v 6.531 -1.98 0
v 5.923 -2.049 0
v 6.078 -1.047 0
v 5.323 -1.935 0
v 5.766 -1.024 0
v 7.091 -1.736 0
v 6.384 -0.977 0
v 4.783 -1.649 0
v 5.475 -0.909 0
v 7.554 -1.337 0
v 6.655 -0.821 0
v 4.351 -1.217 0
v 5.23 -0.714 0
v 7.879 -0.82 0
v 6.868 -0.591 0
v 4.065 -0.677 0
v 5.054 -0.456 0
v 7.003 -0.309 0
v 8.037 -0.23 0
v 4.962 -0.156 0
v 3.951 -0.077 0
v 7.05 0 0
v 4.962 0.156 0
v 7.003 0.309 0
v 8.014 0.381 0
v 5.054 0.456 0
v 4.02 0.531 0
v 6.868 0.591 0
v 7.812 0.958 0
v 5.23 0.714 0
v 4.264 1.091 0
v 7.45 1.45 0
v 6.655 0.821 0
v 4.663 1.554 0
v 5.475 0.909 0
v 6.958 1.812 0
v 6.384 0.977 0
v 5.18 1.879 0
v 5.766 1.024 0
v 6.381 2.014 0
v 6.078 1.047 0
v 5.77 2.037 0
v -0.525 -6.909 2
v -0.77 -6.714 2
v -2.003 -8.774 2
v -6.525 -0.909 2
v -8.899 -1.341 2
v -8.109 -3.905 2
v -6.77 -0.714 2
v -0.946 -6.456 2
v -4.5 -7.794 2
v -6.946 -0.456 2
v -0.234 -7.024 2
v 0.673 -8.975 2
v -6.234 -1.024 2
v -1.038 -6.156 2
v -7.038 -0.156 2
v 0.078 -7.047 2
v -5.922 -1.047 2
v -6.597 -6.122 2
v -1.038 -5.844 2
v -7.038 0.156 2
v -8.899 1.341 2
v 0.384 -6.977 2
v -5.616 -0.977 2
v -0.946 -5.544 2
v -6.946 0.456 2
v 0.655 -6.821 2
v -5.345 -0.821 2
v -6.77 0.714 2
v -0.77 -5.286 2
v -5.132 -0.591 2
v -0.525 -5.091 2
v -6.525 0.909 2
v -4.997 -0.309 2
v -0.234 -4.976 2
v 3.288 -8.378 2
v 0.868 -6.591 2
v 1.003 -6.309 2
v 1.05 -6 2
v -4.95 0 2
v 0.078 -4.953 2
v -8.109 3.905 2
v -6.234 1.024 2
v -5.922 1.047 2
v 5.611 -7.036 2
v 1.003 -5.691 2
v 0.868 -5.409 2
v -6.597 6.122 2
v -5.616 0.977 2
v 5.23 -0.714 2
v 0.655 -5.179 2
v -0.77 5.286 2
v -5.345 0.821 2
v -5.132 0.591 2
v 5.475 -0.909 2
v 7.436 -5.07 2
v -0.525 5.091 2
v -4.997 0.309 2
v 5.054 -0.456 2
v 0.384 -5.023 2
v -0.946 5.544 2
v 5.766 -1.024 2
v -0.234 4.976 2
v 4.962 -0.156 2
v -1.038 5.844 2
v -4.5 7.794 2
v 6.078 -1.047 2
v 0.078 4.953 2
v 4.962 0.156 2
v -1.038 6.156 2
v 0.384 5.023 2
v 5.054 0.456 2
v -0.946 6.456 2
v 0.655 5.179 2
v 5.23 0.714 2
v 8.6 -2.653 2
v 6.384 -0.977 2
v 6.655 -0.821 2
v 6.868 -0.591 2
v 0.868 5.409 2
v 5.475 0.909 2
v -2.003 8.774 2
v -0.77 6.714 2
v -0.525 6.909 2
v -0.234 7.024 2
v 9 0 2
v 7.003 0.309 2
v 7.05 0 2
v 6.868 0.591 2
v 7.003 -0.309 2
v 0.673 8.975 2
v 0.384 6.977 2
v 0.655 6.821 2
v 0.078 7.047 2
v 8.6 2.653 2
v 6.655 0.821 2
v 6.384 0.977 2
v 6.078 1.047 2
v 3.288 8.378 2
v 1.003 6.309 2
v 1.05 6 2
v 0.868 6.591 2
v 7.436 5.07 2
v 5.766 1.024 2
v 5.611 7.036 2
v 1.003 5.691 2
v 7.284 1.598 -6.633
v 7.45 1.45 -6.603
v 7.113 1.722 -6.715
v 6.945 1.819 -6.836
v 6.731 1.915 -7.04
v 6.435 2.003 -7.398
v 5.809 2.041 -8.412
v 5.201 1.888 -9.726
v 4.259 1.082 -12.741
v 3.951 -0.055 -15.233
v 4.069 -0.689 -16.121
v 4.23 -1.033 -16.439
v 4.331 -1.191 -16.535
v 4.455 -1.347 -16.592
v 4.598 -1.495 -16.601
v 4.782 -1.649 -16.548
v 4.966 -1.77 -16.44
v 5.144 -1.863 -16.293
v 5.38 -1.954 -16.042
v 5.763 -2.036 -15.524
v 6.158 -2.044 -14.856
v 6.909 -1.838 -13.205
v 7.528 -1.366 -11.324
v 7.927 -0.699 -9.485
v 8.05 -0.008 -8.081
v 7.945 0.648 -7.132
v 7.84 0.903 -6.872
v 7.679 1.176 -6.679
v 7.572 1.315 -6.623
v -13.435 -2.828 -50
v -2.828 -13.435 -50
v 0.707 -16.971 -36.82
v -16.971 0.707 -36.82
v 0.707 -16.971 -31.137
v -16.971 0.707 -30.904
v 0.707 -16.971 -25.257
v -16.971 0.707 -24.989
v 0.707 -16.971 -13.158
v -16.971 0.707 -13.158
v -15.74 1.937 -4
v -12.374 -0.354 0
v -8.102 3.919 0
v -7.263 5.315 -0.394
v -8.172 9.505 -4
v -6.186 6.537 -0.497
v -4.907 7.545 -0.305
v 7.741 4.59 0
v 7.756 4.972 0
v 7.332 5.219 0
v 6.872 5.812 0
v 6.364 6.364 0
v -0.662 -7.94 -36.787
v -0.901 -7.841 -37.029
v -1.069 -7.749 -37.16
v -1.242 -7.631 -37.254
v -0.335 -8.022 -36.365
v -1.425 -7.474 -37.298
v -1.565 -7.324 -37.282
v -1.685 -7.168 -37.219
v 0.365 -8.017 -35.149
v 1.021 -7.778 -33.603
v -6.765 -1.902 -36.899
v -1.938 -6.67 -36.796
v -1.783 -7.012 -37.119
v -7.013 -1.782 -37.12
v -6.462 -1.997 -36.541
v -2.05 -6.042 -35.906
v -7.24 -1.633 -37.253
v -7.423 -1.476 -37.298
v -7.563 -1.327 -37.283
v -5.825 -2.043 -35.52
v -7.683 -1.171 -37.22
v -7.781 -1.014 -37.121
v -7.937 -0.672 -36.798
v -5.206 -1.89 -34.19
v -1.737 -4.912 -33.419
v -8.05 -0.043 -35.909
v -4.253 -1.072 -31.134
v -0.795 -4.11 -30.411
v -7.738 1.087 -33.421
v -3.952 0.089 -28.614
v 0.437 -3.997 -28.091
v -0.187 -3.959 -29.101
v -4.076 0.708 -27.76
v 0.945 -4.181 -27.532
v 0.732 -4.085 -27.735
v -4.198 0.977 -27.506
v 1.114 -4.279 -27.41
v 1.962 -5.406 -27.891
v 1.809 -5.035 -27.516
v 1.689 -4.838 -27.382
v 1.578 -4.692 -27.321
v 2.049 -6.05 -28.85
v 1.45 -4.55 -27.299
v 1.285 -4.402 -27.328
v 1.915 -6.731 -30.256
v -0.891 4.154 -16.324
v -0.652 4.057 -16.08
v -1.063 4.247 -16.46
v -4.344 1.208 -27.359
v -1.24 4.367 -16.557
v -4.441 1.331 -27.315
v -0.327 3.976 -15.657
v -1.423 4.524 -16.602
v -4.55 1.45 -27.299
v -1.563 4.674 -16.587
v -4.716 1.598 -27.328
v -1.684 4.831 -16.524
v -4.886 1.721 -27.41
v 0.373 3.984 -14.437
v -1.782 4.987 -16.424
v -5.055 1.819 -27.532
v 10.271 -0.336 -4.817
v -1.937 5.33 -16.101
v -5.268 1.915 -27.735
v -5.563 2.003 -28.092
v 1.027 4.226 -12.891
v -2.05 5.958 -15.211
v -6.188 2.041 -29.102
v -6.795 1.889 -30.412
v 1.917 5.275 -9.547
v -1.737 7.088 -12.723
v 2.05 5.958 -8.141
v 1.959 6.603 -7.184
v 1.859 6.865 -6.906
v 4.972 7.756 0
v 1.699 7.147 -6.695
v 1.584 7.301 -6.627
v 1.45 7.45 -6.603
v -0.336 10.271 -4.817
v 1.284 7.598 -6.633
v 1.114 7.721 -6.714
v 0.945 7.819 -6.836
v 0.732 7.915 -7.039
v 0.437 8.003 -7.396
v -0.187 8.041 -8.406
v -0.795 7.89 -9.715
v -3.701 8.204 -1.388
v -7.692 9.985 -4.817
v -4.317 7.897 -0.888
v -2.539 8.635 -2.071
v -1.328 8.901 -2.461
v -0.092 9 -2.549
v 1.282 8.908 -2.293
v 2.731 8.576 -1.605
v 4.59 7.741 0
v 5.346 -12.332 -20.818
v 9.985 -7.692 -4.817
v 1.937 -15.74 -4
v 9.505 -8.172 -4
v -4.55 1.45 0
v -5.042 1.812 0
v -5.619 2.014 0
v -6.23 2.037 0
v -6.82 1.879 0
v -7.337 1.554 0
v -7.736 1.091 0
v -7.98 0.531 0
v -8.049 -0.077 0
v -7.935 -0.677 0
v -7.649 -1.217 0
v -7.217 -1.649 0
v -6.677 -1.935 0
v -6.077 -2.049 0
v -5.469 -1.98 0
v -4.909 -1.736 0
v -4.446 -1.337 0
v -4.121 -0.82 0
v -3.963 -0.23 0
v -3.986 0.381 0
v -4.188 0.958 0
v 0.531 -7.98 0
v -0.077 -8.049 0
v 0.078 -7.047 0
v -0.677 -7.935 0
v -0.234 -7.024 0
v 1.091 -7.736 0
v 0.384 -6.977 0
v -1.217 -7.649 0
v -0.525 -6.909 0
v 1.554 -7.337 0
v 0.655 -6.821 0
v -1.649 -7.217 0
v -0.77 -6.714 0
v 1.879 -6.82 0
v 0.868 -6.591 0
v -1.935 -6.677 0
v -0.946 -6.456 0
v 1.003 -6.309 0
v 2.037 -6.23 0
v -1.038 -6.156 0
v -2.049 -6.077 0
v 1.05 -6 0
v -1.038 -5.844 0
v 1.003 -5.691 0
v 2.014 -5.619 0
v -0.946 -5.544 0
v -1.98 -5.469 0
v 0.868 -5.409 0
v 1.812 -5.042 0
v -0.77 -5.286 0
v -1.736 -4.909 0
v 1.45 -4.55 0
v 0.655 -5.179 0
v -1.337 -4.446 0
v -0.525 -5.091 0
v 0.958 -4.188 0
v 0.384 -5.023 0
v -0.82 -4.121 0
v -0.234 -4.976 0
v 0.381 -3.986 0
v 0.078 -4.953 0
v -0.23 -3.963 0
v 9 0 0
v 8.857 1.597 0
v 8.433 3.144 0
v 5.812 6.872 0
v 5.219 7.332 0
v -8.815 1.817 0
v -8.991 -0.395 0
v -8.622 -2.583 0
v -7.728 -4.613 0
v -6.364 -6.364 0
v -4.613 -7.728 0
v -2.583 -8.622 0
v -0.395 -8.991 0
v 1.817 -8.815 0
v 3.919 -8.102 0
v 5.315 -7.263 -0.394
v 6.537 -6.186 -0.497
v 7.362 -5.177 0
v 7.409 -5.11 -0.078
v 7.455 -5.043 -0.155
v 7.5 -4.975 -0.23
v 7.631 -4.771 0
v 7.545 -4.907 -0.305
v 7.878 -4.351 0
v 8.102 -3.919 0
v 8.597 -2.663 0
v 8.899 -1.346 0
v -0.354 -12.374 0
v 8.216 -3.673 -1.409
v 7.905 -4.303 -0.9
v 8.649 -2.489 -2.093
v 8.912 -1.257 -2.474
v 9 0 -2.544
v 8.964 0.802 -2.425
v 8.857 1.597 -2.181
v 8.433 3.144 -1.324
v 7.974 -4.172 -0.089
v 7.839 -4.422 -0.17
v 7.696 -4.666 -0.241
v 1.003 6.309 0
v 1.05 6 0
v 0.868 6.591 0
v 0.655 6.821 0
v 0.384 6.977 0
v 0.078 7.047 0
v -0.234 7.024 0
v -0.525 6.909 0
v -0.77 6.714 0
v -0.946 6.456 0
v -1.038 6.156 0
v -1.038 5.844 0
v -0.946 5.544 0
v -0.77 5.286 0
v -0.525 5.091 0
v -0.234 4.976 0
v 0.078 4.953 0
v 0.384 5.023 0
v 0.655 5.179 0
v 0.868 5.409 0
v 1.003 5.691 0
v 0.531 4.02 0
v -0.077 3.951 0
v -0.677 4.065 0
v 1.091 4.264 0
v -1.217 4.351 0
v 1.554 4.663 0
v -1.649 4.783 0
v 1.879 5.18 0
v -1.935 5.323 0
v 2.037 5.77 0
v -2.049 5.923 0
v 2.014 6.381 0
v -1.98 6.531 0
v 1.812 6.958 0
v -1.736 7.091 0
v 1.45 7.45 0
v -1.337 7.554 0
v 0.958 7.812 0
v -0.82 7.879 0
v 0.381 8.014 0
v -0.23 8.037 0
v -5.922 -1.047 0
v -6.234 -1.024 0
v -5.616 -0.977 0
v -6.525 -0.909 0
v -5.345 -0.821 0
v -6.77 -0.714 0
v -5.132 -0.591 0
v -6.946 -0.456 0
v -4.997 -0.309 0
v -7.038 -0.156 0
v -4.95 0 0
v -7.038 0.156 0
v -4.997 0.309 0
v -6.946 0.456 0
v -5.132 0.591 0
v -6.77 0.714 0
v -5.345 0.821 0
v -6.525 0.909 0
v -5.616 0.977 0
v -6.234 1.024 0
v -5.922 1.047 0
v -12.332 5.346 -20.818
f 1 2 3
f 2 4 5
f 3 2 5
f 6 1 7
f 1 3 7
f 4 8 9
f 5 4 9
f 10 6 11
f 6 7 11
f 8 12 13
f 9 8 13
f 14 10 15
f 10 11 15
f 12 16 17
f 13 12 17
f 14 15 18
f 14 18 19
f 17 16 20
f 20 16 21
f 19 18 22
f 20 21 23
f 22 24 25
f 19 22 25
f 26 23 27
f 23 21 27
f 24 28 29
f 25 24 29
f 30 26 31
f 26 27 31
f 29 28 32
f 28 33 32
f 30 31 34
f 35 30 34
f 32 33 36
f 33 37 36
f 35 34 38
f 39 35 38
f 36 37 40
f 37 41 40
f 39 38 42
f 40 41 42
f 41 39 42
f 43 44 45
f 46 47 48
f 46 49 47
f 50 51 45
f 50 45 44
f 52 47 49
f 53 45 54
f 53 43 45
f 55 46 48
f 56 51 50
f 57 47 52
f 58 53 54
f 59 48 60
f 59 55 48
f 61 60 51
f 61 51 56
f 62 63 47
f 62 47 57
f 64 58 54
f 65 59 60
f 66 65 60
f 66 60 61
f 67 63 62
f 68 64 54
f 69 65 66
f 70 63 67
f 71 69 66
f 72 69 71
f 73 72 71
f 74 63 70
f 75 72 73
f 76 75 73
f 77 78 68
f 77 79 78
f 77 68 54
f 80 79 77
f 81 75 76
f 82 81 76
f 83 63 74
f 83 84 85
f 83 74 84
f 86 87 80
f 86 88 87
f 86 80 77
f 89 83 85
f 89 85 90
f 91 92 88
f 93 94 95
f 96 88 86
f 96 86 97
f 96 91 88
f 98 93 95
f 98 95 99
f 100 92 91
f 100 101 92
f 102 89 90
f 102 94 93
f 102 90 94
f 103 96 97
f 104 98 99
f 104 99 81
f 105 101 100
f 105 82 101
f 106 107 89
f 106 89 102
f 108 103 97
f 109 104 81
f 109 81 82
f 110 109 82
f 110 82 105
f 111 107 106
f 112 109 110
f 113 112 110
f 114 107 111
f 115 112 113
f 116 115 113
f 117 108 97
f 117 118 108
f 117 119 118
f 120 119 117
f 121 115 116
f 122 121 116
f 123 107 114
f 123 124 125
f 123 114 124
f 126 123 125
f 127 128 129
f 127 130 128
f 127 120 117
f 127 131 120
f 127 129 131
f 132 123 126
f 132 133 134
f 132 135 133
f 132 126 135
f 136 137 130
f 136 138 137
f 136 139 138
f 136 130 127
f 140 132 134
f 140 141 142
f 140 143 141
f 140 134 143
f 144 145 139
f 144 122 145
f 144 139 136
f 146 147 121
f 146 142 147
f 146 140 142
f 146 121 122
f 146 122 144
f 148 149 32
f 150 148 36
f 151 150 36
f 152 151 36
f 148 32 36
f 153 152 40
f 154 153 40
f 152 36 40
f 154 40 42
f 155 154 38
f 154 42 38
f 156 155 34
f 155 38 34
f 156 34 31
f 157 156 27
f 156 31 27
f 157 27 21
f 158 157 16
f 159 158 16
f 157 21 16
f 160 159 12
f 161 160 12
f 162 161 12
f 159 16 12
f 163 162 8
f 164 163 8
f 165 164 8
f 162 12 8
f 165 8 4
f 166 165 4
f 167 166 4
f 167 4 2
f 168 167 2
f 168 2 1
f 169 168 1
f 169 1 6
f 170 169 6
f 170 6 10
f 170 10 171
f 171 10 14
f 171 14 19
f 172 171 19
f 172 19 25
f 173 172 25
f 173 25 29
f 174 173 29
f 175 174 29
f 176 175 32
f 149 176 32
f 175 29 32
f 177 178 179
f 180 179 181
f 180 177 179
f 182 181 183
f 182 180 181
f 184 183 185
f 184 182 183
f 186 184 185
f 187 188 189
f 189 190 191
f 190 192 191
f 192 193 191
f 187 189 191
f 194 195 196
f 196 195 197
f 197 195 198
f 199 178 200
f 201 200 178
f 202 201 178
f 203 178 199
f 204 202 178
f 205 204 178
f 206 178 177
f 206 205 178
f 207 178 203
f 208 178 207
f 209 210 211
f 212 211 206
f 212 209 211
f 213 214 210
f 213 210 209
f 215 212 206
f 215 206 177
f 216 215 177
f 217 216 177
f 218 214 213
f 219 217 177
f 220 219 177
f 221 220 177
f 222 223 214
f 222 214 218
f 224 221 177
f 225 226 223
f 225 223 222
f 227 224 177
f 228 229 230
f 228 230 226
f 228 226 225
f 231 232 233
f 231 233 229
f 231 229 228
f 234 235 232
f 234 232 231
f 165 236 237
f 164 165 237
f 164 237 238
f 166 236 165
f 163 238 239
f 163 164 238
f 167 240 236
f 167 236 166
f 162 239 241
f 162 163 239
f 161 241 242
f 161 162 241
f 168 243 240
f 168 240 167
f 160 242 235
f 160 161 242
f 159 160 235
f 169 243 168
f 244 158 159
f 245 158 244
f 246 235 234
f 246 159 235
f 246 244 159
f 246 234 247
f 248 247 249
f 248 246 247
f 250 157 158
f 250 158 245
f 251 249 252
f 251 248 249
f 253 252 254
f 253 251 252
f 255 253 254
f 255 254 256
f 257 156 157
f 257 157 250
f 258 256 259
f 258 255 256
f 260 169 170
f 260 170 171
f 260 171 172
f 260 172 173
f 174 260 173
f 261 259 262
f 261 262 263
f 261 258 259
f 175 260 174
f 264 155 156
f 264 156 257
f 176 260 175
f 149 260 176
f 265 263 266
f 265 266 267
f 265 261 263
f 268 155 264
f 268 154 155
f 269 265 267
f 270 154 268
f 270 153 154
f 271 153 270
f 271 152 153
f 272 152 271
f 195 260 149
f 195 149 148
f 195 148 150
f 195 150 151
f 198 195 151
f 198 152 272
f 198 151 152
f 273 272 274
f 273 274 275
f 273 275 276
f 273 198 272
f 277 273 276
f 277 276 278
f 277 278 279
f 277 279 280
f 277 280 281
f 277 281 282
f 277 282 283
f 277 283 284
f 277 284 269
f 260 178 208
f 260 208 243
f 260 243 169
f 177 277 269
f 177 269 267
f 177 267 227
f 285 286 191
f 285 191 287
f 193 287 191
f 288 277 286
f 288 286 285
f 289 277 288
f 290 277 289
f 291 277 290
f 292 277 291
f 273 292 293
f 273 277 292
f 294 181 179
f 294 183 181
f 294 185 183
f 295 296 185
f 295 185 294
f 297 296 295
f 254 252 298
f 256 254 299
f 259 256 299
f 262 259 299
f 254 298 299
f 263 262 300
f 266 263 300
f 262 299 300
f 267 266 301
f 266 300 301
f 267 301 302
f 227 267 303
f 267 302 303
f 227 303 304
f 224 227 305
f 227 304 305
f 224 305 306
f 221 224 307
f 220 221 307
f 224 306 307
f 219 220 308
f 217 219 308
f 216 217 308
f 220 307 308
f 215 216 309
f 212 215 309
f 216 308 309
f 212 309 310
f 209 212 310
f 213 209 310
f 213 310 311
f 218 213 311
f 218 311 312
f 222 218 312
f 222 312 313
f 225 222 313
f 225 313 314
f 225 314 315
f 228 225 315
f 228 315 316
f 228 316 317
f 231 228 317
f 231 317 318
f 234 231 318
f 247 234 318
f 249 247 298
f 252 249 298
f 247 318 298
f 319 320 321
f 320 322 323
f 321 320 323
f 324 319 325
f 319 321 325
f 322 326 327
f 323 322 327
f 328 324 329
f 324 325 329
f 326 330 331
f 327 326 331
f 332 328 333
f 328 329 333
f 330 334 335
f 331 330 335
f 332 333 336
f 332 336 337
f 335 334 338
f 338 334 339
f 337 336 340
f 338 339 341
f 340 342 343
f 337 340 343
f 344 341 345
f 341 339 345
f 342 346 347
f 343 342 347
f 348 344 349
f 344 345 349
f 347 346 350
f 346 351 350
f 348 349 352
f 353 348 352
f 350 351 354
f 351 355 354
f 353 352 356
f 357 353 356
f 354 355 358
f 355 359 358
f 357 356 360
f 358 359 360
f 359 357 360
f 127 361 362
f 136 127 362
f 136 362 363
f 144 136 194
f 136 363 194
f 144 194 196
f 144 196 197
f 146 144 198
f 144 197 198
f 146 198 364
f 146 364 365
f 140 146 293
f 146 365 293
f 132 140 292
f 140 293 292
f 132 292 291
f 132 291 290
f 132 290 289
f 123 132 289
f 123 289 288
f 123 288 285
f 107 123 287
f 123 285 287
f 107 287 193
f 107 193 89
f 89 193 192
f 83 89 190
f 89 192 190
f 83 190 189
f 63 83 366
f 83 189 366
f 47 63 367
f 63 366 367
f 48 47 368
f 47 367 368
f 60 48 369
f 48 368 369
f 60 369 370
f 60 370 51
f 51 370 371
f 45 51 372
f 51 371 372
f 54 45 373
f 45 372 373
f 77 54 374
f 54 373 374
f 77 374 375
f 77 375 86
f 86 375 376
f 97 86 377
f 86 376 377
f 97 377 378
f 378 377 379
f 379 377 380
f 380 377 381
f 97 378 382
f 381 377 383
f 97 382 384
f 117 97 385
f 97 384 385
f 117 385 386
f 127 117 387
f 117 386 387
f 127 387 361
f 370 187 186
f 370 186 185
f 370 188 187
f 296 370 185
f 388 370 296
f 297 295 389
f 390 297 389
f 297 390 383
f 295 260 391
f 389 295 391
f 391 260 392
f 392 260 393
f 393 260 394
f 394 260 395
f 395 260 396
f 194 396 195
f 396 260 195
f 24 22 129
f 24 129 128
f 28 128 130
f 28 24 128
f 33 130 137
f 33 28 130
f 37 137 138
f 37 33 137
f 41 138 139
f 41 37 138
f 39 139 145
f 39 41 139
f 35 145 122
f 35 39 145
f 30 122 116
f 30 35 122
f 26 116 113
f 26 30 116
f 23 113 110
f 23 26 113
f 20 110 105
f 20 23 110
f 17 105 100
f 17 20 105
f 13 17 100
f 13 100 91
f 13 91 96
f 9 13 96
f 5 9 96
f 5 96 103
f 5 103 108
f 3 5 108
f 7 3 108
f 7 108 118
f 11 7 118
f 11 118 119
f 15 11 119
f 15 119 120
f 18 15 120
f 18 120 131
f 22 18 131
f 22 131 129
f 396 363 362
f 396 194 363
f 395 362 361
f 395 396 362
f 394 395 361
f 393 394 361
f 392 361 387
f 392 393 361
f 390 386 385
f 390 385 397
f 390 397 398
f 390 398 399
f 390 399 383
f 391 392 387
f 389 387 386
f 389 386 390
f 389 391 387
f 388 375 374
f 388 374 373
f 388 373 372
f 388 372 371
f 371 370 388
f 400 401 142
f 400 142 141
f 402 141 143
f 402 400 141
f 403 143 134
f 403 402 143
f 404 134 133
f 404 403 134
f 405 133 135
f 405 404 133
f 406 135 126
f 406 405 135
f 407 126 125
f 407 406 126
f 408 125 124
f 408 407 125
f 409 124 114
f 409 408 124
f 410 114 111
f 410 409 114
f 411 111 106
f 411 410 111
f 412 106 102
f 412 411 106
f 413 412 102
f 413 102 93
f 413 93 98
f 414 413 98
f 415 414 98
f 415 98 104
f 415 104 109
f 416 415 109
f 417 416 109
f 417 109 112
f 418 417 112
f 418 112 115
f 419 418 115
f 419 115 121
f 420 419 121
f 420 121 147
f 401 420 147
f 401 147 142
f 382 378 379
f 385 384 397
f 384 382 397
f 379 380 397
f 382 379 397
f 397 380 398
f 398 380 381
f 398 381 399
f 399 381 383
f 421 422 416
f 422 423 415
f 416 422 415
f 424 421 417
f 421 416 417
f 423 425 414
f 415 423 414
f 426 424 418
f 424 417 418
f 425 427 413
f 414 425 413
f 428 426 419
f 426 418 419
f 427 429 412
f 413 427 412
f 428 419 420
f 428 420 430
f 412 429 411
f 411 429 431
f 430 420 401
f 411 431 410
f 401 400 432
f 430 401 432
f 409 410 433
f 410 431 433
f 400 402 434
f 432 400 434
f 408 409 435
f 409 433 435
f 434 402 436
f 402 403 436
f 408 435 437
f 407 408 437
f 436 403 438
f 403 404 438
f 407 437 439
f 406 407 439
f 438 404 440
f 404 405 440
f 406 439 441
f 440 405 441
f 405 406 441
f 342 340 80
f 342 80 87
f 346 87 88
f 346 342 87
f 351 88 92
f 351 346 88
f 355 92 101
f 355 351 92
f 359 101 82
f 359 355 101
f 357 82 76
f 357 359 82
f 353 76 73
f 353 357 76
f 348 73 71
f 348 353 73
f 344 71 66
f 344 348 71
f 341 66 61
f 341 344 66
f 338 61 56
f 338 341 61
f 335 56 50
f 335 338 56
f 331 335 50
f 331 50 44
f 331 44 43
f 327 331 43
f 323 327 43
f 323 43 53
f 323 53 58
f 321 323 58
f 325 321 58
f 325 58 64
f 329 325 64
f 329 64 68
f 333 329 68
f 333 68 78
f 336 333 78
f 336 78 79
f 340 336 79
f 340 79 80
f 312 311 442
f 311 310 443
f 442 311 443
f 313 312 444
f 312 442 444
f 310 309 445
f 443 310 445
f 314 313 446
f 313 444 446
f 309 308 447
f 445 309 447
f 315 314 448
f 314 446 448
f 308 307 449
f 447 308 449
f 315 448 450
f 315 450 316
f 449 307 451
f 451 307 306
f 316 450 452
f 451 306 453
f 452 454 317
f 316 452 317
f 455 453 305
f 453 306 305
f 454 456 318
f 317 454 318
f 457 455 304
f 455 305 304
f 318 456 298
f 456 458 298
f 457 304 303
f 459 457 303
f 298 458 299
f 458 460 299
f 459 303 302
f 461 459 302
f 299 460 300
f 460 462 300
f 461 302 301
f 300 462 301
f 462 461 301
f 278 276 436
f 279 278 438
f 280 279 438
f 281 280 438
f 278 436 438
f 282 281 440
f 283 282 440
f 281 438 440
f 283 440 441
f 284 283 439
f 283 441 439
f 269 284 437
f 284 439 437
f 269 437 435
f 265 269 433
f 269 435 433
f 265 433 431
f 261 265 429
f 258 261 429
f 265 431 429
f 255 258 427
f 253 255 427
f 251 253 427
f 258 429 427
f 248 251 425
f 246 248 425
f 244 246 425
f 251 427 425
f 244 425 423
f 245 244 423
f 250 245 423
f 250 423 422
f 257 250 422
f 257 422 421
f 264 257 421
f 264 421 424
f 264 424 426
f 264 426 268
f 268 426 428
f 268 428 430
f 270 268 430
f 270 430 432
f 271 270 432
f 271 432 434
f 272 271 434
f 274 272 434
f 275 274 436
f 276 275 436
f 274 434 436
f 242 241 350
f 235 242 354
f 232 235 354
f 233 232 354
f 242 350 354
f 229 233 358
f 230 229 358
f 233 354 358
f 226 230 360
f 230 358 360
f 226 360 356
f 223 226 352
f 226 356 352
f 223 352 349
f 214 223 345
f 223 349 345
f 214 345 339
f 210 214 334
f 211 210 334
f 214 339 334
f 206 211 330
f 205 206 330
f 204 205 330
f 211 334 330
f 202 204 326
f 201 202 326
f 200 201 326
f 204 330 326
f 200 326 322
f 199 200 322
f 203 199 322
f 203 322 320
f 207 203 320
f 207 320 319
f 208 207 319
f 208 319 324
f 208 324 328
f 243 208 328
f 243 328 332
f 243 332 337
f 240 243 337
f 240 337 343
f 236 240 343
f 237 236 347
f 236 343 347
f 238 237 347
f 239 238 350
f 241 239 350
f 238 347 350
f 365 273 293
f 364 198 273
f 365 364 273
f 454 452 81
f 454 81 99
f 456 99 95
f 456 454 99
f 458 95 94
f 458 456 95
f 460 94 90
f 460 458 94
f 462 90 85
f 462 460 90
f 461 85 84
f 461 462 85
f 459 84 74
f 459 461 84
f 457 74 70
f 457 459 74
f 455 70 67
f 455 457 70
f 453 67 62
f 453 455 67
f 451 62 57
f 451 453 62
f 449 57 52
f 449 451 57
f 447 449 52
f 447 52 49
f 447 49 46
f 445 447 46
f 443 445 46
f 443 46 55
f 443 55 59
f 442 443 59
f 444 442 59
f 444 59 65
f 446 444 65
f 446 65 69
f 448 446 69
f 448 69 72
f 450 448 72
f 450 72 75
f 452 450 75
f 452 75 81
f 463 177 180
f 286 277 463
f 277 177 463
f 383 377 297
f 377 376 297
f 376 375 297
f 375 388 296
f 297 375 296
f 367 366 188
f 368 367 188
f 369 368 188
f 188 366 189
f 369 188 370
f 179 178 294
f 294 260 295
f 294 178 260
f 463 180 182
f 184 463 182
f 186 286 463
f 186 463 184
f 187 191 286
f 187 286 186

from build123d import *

# Parameters (mm, degrees)
SKETCH1_R           = 9
SKETCH1_R_2         = 1.05
BOSS_EXTRUDE1_DEPTH = 2
CHAMFER1_SIZE       = 4
CUT_EXTRUDE3_START  = -53
SKETCH6_R           = 1.05
CUT_EXTRUDE3_DEPTH  = 53
CUT_EXTRUDE4_START  = -2
SKETCH5_R           = 2.05
CUT_EXTRUDE4_DEPTH  = 53
CHAMFER2_SIZE       = 5
CHAMFER3_SIZE       = 5
CHAMFER3_SIZE_2     = 4.05977785
SKETCH8_W           = 40.645388092
SKETCH8_H           = 21.779978949
CUT_EXTRUDE5_DEPTH  = 34


with BuildPart() as part:
    # Sketch1 → Boss-Extrude1 (new body)
    with BuildSketch(Plane.XY):
        Circle(SKETCH1_R)
        with Locations((0, 6)):
            Circle(SKETCH1_R_2, mode=Mode.SUBTRACT)
        with Locations((-6, 0)):
            Circle(SKETCH1_R_2, mode=Mode.SUBTRACT)
        with Locations((0, -6)):
            Circle(SKETCH1_R_2, mode=Mode.SUBTRACT)
        with Locations((6, 0)):
            Circle(SKETCH1_R_2, mode=Mode.SUBTRACT)
    extrude(amount=BOSS_EXTRUDE1_DEPTH)

    # Sketch3 → Loft1 section 0
    with BuildSketch(Plane(origin=(0, 0, -50), x_dir=(-1, 0, 0), z_dir=(0, 0, -1))):
        with BuildLine():
            Line((-0.707106781, -16.970562748), (16.970562748, 0.707106781))
            Line((16.970562748, 0.707106781), (21.920310217, -4.242640687))
            Line((21.920310217, -4.242640687), (4.242640687, -21.920310217))
            Line((4.242640687, -21.920310217), (-0.707106781, -16.970562748))
        make_face()
    # Sketch2 → Loft1 section 1
    with BuildSketch(Plane(origin=(0, 0, 0), x_dir=(-1, 0, 0), z_dir=(0, 0, -1))):
        with BuildLine():
            Line((-15.202795796, -2.474873734), (2.474873734, 15.202795796))
            Line((2.474873734, 15.202795796), (15.202795796, 2.474873734))
            Line((15.202795796, 2.474873734), (-2.474873734, -15.202795796))
            Line((-2.474873734, -15.202795796), (-15.202795796, -2.474873734))
        make_face()
    loft()

    # Chamfer1
    # the kernel refuses this chamfer: 4 mm, written as the material it takes off along each edge
    with BuildSketch(Plane(origin=(-4.798944185, -22.476613715, 0), x_dir=(-0.7068394360706721, 0.7068394360706747, 0.027495876610586344), z_dir=(0.7071067811865488, 0.7071067811865462, 0))) as chamfer1_piece_1_section:
        Polygon((CHAMFER1_SIZE * 0.999621916911, -CHAMFER1_SIZE * 0.0274958766106), (-CHAMFER1_SIZE * 0.0274958766106, -CHAMFER1_SIZE * 0.999621916911), (0, 0), align=None)
    chamfer1_piece_1 = extrude(amount=38.573463904, mode=Mode.PRIVATE)
    chamfer1_piece_1 = chamfer1_piece_1 - Plane(origin=(0, 0, -1.322334287), x_dir=(1, 0, 0), z_dir=(0, 0, -1)) * Cylinder(9, 94, mode=Mode.PRIVATE)
    add(chamfer1_piece_1, mode=Mode.SUBTRACT)
    with BuildSketch(Plane(origin=(4.798944185, 22.476613715, 0), x_dir=(0.7068394360706721, -0.7068394360706749, 0.027495876610586396), z_dir=(-0.7071067811865489, -0.7071067811865461, 0))) as chamfer1_piece_2_section:
        Polygon((CHAMFER1_SIZE * 0.999621916911, -CHAMFER1_SIZE * 0.0274958766106), (-CHAMFER1_SIZE * 0.0274958766106, -CHAMFER1_SIZE * 0.999621916911), (0, 0), align=None)
    chamfer1_piece_2 = extrude(amount=38.573463904, mode=Mode.PRIVATE)
    chamfer1_piece_2 = chamfer1_piece_2 - Plane(origin=(0, 0, -1.322334287), x_dir=(1, 0, 0), z_dir=(0, 0, -1)) * Cylinder(9, 94, mode=Mode.PRIVATE)
    add(chamfer1_piece_2, mode=Mode.SUBTRACT)

    # Sketch6 → Cut-Extrude3 (cut)
    with BuildSketch(Plane.XY.offset(2).offset(CUT_EXTRUDE3_START)):
        with Locations(Location((0, -6, 0), (0, 0, 45))):
            Circle(SKETCH6_R)
        with Locations(Location((6, 0, 0), (0, 0, 45))):
            Circle(SKETCH6_R)
        with Locations(Location((0, 6, 0), (0, 0, 45))):
            Circle(SKETCH6_R)
        with Locations(Location((-6, 0, 0), (0, 0, 45))):
            Circle(SKETCH6_R)
    extrude(amount=CUT_EXTRUDE3_DEPTH, mode=Mode.SUBTRACT)

    # Sketch5 → Cut-Extrude4 (cut)
    with BuildSketch(Plane.XY.offset(2).offset(CUT_EXTRUDE4_START)):
        with Locations(Location((-6, 0, 0), (0, 0, 45))):
            Circle(SKETCH5_R)
        with Locations(Location((0, -6, 0), (0, 0, 45))):
            Circle(SKETCH5_R)
        with Locations(Location((0, 6, 0), (0, 0, 45))):
            Circle(SKETCH5_R)
        with Locations(Location((6, 0, 0), (0, 0, 45))):
            Circle(SKETCH5_R)
    extrude(amount=-CUT_EXTRUDE4_DEPTH, mode=Mode.SUBTRACT)

    # Chamfer2
    chamfer2_edges = [part.edges().sort_by_distance(p)[0] for p in [
        (-10.302545802, 7.375123728, -27),
        (7.375123728, -10.302545802, -27),
    ]]
    chamfer(chamfer2_edges, length=CHAMFER2_SIZE)

    # Chamfer3
    # the kernel refuses this chamfer: 5, 4.05977785 mm, written as the material it takes off along each edge
    with BuildSketch(Plane(origin=(13.909394742, 12.166115274, 0), x_dir=(0.009375164320641791, -0.2414717461398742, -0.9703625621952453), z_dir=(-0.9992471568778876, -0.03879586925767199, 0))) as chamfer3_piece_1_section:
        Polygon((CHAMFER3_SIZE * 0.999621916911, CHAMFER3_SIZE * 0.0274958766106), (CHAMFER3_SIZE_2 * 0.241653673437, CHAMFER3_SIZE_2 * 0.970362562158), (0, 0), align=None)
    chamfer3_piece_1 = extrude(amount=27.189276823, mode=Mode.PRIVATE)
    chamfer3_piece_1 = chamfer3_piece_1 - Plane(origin=(0, 0, -1.642174888), x_dir=(1, 0, 0), z_dir=(0, 0, -1)) * Cylinder(9, 75, mode=Mode.PRIVATE)
    add(chamfer3_piece_1, mode=Mode.SUBTRACT)
    with BuildSketch(Plane(origin=(12.166115274, 13.909394742, 0), x_dir=(-0.2414717461398332, 0.009375164320638266, -0.9703625621952554), z_dir=(-0.03879586925766401, -0.9992471568778879, 0))) as chamfer3_piece_2_section:
        Polygon((CHAMFER3_SIZE * 0.999621916911, -CHAMFER3_SIZE * 0.0274958766106), (CHAMFER3_SIZE_2 * 0.241653673437, -CHAMFER3_SIZE_2 * 0.970362562158), (0, 0), align=None)
    chamfer3_piece_2 = extrude(amount=27.189276823, mode=Mode.PRIVATE)
    chamfer3_piece_2 = chamfer3_piece_2 - Plane(origin=(0, 0, -1.642174892), x_dir=(1, 0, 0), z_dir=(0, 0, -1)) * Cylinder(9, 75, mode=Mode.PRIVATE)
    add(chamfer3_piece_2, mode=Mode.SUBTRACT)

    # Sketch8 → Cut-Extrude5 (cut)
    with BuildSketch(Plane(origin=(-8.838834765, 8.838834765, 0), x_dir=(0, 0, 1), z_dir=(-0.7071067811865461, 0.7071067811865489, 0))):
        with Locations((-29.677305954, -22.389989475)):
            Rectangle(SKETCH8_W, SKETCH8_H)
    extrude(amount=-CUT_EXTRUDE5_DEPTH, mode=Mode.SUBTRACT)


solid = part.part
